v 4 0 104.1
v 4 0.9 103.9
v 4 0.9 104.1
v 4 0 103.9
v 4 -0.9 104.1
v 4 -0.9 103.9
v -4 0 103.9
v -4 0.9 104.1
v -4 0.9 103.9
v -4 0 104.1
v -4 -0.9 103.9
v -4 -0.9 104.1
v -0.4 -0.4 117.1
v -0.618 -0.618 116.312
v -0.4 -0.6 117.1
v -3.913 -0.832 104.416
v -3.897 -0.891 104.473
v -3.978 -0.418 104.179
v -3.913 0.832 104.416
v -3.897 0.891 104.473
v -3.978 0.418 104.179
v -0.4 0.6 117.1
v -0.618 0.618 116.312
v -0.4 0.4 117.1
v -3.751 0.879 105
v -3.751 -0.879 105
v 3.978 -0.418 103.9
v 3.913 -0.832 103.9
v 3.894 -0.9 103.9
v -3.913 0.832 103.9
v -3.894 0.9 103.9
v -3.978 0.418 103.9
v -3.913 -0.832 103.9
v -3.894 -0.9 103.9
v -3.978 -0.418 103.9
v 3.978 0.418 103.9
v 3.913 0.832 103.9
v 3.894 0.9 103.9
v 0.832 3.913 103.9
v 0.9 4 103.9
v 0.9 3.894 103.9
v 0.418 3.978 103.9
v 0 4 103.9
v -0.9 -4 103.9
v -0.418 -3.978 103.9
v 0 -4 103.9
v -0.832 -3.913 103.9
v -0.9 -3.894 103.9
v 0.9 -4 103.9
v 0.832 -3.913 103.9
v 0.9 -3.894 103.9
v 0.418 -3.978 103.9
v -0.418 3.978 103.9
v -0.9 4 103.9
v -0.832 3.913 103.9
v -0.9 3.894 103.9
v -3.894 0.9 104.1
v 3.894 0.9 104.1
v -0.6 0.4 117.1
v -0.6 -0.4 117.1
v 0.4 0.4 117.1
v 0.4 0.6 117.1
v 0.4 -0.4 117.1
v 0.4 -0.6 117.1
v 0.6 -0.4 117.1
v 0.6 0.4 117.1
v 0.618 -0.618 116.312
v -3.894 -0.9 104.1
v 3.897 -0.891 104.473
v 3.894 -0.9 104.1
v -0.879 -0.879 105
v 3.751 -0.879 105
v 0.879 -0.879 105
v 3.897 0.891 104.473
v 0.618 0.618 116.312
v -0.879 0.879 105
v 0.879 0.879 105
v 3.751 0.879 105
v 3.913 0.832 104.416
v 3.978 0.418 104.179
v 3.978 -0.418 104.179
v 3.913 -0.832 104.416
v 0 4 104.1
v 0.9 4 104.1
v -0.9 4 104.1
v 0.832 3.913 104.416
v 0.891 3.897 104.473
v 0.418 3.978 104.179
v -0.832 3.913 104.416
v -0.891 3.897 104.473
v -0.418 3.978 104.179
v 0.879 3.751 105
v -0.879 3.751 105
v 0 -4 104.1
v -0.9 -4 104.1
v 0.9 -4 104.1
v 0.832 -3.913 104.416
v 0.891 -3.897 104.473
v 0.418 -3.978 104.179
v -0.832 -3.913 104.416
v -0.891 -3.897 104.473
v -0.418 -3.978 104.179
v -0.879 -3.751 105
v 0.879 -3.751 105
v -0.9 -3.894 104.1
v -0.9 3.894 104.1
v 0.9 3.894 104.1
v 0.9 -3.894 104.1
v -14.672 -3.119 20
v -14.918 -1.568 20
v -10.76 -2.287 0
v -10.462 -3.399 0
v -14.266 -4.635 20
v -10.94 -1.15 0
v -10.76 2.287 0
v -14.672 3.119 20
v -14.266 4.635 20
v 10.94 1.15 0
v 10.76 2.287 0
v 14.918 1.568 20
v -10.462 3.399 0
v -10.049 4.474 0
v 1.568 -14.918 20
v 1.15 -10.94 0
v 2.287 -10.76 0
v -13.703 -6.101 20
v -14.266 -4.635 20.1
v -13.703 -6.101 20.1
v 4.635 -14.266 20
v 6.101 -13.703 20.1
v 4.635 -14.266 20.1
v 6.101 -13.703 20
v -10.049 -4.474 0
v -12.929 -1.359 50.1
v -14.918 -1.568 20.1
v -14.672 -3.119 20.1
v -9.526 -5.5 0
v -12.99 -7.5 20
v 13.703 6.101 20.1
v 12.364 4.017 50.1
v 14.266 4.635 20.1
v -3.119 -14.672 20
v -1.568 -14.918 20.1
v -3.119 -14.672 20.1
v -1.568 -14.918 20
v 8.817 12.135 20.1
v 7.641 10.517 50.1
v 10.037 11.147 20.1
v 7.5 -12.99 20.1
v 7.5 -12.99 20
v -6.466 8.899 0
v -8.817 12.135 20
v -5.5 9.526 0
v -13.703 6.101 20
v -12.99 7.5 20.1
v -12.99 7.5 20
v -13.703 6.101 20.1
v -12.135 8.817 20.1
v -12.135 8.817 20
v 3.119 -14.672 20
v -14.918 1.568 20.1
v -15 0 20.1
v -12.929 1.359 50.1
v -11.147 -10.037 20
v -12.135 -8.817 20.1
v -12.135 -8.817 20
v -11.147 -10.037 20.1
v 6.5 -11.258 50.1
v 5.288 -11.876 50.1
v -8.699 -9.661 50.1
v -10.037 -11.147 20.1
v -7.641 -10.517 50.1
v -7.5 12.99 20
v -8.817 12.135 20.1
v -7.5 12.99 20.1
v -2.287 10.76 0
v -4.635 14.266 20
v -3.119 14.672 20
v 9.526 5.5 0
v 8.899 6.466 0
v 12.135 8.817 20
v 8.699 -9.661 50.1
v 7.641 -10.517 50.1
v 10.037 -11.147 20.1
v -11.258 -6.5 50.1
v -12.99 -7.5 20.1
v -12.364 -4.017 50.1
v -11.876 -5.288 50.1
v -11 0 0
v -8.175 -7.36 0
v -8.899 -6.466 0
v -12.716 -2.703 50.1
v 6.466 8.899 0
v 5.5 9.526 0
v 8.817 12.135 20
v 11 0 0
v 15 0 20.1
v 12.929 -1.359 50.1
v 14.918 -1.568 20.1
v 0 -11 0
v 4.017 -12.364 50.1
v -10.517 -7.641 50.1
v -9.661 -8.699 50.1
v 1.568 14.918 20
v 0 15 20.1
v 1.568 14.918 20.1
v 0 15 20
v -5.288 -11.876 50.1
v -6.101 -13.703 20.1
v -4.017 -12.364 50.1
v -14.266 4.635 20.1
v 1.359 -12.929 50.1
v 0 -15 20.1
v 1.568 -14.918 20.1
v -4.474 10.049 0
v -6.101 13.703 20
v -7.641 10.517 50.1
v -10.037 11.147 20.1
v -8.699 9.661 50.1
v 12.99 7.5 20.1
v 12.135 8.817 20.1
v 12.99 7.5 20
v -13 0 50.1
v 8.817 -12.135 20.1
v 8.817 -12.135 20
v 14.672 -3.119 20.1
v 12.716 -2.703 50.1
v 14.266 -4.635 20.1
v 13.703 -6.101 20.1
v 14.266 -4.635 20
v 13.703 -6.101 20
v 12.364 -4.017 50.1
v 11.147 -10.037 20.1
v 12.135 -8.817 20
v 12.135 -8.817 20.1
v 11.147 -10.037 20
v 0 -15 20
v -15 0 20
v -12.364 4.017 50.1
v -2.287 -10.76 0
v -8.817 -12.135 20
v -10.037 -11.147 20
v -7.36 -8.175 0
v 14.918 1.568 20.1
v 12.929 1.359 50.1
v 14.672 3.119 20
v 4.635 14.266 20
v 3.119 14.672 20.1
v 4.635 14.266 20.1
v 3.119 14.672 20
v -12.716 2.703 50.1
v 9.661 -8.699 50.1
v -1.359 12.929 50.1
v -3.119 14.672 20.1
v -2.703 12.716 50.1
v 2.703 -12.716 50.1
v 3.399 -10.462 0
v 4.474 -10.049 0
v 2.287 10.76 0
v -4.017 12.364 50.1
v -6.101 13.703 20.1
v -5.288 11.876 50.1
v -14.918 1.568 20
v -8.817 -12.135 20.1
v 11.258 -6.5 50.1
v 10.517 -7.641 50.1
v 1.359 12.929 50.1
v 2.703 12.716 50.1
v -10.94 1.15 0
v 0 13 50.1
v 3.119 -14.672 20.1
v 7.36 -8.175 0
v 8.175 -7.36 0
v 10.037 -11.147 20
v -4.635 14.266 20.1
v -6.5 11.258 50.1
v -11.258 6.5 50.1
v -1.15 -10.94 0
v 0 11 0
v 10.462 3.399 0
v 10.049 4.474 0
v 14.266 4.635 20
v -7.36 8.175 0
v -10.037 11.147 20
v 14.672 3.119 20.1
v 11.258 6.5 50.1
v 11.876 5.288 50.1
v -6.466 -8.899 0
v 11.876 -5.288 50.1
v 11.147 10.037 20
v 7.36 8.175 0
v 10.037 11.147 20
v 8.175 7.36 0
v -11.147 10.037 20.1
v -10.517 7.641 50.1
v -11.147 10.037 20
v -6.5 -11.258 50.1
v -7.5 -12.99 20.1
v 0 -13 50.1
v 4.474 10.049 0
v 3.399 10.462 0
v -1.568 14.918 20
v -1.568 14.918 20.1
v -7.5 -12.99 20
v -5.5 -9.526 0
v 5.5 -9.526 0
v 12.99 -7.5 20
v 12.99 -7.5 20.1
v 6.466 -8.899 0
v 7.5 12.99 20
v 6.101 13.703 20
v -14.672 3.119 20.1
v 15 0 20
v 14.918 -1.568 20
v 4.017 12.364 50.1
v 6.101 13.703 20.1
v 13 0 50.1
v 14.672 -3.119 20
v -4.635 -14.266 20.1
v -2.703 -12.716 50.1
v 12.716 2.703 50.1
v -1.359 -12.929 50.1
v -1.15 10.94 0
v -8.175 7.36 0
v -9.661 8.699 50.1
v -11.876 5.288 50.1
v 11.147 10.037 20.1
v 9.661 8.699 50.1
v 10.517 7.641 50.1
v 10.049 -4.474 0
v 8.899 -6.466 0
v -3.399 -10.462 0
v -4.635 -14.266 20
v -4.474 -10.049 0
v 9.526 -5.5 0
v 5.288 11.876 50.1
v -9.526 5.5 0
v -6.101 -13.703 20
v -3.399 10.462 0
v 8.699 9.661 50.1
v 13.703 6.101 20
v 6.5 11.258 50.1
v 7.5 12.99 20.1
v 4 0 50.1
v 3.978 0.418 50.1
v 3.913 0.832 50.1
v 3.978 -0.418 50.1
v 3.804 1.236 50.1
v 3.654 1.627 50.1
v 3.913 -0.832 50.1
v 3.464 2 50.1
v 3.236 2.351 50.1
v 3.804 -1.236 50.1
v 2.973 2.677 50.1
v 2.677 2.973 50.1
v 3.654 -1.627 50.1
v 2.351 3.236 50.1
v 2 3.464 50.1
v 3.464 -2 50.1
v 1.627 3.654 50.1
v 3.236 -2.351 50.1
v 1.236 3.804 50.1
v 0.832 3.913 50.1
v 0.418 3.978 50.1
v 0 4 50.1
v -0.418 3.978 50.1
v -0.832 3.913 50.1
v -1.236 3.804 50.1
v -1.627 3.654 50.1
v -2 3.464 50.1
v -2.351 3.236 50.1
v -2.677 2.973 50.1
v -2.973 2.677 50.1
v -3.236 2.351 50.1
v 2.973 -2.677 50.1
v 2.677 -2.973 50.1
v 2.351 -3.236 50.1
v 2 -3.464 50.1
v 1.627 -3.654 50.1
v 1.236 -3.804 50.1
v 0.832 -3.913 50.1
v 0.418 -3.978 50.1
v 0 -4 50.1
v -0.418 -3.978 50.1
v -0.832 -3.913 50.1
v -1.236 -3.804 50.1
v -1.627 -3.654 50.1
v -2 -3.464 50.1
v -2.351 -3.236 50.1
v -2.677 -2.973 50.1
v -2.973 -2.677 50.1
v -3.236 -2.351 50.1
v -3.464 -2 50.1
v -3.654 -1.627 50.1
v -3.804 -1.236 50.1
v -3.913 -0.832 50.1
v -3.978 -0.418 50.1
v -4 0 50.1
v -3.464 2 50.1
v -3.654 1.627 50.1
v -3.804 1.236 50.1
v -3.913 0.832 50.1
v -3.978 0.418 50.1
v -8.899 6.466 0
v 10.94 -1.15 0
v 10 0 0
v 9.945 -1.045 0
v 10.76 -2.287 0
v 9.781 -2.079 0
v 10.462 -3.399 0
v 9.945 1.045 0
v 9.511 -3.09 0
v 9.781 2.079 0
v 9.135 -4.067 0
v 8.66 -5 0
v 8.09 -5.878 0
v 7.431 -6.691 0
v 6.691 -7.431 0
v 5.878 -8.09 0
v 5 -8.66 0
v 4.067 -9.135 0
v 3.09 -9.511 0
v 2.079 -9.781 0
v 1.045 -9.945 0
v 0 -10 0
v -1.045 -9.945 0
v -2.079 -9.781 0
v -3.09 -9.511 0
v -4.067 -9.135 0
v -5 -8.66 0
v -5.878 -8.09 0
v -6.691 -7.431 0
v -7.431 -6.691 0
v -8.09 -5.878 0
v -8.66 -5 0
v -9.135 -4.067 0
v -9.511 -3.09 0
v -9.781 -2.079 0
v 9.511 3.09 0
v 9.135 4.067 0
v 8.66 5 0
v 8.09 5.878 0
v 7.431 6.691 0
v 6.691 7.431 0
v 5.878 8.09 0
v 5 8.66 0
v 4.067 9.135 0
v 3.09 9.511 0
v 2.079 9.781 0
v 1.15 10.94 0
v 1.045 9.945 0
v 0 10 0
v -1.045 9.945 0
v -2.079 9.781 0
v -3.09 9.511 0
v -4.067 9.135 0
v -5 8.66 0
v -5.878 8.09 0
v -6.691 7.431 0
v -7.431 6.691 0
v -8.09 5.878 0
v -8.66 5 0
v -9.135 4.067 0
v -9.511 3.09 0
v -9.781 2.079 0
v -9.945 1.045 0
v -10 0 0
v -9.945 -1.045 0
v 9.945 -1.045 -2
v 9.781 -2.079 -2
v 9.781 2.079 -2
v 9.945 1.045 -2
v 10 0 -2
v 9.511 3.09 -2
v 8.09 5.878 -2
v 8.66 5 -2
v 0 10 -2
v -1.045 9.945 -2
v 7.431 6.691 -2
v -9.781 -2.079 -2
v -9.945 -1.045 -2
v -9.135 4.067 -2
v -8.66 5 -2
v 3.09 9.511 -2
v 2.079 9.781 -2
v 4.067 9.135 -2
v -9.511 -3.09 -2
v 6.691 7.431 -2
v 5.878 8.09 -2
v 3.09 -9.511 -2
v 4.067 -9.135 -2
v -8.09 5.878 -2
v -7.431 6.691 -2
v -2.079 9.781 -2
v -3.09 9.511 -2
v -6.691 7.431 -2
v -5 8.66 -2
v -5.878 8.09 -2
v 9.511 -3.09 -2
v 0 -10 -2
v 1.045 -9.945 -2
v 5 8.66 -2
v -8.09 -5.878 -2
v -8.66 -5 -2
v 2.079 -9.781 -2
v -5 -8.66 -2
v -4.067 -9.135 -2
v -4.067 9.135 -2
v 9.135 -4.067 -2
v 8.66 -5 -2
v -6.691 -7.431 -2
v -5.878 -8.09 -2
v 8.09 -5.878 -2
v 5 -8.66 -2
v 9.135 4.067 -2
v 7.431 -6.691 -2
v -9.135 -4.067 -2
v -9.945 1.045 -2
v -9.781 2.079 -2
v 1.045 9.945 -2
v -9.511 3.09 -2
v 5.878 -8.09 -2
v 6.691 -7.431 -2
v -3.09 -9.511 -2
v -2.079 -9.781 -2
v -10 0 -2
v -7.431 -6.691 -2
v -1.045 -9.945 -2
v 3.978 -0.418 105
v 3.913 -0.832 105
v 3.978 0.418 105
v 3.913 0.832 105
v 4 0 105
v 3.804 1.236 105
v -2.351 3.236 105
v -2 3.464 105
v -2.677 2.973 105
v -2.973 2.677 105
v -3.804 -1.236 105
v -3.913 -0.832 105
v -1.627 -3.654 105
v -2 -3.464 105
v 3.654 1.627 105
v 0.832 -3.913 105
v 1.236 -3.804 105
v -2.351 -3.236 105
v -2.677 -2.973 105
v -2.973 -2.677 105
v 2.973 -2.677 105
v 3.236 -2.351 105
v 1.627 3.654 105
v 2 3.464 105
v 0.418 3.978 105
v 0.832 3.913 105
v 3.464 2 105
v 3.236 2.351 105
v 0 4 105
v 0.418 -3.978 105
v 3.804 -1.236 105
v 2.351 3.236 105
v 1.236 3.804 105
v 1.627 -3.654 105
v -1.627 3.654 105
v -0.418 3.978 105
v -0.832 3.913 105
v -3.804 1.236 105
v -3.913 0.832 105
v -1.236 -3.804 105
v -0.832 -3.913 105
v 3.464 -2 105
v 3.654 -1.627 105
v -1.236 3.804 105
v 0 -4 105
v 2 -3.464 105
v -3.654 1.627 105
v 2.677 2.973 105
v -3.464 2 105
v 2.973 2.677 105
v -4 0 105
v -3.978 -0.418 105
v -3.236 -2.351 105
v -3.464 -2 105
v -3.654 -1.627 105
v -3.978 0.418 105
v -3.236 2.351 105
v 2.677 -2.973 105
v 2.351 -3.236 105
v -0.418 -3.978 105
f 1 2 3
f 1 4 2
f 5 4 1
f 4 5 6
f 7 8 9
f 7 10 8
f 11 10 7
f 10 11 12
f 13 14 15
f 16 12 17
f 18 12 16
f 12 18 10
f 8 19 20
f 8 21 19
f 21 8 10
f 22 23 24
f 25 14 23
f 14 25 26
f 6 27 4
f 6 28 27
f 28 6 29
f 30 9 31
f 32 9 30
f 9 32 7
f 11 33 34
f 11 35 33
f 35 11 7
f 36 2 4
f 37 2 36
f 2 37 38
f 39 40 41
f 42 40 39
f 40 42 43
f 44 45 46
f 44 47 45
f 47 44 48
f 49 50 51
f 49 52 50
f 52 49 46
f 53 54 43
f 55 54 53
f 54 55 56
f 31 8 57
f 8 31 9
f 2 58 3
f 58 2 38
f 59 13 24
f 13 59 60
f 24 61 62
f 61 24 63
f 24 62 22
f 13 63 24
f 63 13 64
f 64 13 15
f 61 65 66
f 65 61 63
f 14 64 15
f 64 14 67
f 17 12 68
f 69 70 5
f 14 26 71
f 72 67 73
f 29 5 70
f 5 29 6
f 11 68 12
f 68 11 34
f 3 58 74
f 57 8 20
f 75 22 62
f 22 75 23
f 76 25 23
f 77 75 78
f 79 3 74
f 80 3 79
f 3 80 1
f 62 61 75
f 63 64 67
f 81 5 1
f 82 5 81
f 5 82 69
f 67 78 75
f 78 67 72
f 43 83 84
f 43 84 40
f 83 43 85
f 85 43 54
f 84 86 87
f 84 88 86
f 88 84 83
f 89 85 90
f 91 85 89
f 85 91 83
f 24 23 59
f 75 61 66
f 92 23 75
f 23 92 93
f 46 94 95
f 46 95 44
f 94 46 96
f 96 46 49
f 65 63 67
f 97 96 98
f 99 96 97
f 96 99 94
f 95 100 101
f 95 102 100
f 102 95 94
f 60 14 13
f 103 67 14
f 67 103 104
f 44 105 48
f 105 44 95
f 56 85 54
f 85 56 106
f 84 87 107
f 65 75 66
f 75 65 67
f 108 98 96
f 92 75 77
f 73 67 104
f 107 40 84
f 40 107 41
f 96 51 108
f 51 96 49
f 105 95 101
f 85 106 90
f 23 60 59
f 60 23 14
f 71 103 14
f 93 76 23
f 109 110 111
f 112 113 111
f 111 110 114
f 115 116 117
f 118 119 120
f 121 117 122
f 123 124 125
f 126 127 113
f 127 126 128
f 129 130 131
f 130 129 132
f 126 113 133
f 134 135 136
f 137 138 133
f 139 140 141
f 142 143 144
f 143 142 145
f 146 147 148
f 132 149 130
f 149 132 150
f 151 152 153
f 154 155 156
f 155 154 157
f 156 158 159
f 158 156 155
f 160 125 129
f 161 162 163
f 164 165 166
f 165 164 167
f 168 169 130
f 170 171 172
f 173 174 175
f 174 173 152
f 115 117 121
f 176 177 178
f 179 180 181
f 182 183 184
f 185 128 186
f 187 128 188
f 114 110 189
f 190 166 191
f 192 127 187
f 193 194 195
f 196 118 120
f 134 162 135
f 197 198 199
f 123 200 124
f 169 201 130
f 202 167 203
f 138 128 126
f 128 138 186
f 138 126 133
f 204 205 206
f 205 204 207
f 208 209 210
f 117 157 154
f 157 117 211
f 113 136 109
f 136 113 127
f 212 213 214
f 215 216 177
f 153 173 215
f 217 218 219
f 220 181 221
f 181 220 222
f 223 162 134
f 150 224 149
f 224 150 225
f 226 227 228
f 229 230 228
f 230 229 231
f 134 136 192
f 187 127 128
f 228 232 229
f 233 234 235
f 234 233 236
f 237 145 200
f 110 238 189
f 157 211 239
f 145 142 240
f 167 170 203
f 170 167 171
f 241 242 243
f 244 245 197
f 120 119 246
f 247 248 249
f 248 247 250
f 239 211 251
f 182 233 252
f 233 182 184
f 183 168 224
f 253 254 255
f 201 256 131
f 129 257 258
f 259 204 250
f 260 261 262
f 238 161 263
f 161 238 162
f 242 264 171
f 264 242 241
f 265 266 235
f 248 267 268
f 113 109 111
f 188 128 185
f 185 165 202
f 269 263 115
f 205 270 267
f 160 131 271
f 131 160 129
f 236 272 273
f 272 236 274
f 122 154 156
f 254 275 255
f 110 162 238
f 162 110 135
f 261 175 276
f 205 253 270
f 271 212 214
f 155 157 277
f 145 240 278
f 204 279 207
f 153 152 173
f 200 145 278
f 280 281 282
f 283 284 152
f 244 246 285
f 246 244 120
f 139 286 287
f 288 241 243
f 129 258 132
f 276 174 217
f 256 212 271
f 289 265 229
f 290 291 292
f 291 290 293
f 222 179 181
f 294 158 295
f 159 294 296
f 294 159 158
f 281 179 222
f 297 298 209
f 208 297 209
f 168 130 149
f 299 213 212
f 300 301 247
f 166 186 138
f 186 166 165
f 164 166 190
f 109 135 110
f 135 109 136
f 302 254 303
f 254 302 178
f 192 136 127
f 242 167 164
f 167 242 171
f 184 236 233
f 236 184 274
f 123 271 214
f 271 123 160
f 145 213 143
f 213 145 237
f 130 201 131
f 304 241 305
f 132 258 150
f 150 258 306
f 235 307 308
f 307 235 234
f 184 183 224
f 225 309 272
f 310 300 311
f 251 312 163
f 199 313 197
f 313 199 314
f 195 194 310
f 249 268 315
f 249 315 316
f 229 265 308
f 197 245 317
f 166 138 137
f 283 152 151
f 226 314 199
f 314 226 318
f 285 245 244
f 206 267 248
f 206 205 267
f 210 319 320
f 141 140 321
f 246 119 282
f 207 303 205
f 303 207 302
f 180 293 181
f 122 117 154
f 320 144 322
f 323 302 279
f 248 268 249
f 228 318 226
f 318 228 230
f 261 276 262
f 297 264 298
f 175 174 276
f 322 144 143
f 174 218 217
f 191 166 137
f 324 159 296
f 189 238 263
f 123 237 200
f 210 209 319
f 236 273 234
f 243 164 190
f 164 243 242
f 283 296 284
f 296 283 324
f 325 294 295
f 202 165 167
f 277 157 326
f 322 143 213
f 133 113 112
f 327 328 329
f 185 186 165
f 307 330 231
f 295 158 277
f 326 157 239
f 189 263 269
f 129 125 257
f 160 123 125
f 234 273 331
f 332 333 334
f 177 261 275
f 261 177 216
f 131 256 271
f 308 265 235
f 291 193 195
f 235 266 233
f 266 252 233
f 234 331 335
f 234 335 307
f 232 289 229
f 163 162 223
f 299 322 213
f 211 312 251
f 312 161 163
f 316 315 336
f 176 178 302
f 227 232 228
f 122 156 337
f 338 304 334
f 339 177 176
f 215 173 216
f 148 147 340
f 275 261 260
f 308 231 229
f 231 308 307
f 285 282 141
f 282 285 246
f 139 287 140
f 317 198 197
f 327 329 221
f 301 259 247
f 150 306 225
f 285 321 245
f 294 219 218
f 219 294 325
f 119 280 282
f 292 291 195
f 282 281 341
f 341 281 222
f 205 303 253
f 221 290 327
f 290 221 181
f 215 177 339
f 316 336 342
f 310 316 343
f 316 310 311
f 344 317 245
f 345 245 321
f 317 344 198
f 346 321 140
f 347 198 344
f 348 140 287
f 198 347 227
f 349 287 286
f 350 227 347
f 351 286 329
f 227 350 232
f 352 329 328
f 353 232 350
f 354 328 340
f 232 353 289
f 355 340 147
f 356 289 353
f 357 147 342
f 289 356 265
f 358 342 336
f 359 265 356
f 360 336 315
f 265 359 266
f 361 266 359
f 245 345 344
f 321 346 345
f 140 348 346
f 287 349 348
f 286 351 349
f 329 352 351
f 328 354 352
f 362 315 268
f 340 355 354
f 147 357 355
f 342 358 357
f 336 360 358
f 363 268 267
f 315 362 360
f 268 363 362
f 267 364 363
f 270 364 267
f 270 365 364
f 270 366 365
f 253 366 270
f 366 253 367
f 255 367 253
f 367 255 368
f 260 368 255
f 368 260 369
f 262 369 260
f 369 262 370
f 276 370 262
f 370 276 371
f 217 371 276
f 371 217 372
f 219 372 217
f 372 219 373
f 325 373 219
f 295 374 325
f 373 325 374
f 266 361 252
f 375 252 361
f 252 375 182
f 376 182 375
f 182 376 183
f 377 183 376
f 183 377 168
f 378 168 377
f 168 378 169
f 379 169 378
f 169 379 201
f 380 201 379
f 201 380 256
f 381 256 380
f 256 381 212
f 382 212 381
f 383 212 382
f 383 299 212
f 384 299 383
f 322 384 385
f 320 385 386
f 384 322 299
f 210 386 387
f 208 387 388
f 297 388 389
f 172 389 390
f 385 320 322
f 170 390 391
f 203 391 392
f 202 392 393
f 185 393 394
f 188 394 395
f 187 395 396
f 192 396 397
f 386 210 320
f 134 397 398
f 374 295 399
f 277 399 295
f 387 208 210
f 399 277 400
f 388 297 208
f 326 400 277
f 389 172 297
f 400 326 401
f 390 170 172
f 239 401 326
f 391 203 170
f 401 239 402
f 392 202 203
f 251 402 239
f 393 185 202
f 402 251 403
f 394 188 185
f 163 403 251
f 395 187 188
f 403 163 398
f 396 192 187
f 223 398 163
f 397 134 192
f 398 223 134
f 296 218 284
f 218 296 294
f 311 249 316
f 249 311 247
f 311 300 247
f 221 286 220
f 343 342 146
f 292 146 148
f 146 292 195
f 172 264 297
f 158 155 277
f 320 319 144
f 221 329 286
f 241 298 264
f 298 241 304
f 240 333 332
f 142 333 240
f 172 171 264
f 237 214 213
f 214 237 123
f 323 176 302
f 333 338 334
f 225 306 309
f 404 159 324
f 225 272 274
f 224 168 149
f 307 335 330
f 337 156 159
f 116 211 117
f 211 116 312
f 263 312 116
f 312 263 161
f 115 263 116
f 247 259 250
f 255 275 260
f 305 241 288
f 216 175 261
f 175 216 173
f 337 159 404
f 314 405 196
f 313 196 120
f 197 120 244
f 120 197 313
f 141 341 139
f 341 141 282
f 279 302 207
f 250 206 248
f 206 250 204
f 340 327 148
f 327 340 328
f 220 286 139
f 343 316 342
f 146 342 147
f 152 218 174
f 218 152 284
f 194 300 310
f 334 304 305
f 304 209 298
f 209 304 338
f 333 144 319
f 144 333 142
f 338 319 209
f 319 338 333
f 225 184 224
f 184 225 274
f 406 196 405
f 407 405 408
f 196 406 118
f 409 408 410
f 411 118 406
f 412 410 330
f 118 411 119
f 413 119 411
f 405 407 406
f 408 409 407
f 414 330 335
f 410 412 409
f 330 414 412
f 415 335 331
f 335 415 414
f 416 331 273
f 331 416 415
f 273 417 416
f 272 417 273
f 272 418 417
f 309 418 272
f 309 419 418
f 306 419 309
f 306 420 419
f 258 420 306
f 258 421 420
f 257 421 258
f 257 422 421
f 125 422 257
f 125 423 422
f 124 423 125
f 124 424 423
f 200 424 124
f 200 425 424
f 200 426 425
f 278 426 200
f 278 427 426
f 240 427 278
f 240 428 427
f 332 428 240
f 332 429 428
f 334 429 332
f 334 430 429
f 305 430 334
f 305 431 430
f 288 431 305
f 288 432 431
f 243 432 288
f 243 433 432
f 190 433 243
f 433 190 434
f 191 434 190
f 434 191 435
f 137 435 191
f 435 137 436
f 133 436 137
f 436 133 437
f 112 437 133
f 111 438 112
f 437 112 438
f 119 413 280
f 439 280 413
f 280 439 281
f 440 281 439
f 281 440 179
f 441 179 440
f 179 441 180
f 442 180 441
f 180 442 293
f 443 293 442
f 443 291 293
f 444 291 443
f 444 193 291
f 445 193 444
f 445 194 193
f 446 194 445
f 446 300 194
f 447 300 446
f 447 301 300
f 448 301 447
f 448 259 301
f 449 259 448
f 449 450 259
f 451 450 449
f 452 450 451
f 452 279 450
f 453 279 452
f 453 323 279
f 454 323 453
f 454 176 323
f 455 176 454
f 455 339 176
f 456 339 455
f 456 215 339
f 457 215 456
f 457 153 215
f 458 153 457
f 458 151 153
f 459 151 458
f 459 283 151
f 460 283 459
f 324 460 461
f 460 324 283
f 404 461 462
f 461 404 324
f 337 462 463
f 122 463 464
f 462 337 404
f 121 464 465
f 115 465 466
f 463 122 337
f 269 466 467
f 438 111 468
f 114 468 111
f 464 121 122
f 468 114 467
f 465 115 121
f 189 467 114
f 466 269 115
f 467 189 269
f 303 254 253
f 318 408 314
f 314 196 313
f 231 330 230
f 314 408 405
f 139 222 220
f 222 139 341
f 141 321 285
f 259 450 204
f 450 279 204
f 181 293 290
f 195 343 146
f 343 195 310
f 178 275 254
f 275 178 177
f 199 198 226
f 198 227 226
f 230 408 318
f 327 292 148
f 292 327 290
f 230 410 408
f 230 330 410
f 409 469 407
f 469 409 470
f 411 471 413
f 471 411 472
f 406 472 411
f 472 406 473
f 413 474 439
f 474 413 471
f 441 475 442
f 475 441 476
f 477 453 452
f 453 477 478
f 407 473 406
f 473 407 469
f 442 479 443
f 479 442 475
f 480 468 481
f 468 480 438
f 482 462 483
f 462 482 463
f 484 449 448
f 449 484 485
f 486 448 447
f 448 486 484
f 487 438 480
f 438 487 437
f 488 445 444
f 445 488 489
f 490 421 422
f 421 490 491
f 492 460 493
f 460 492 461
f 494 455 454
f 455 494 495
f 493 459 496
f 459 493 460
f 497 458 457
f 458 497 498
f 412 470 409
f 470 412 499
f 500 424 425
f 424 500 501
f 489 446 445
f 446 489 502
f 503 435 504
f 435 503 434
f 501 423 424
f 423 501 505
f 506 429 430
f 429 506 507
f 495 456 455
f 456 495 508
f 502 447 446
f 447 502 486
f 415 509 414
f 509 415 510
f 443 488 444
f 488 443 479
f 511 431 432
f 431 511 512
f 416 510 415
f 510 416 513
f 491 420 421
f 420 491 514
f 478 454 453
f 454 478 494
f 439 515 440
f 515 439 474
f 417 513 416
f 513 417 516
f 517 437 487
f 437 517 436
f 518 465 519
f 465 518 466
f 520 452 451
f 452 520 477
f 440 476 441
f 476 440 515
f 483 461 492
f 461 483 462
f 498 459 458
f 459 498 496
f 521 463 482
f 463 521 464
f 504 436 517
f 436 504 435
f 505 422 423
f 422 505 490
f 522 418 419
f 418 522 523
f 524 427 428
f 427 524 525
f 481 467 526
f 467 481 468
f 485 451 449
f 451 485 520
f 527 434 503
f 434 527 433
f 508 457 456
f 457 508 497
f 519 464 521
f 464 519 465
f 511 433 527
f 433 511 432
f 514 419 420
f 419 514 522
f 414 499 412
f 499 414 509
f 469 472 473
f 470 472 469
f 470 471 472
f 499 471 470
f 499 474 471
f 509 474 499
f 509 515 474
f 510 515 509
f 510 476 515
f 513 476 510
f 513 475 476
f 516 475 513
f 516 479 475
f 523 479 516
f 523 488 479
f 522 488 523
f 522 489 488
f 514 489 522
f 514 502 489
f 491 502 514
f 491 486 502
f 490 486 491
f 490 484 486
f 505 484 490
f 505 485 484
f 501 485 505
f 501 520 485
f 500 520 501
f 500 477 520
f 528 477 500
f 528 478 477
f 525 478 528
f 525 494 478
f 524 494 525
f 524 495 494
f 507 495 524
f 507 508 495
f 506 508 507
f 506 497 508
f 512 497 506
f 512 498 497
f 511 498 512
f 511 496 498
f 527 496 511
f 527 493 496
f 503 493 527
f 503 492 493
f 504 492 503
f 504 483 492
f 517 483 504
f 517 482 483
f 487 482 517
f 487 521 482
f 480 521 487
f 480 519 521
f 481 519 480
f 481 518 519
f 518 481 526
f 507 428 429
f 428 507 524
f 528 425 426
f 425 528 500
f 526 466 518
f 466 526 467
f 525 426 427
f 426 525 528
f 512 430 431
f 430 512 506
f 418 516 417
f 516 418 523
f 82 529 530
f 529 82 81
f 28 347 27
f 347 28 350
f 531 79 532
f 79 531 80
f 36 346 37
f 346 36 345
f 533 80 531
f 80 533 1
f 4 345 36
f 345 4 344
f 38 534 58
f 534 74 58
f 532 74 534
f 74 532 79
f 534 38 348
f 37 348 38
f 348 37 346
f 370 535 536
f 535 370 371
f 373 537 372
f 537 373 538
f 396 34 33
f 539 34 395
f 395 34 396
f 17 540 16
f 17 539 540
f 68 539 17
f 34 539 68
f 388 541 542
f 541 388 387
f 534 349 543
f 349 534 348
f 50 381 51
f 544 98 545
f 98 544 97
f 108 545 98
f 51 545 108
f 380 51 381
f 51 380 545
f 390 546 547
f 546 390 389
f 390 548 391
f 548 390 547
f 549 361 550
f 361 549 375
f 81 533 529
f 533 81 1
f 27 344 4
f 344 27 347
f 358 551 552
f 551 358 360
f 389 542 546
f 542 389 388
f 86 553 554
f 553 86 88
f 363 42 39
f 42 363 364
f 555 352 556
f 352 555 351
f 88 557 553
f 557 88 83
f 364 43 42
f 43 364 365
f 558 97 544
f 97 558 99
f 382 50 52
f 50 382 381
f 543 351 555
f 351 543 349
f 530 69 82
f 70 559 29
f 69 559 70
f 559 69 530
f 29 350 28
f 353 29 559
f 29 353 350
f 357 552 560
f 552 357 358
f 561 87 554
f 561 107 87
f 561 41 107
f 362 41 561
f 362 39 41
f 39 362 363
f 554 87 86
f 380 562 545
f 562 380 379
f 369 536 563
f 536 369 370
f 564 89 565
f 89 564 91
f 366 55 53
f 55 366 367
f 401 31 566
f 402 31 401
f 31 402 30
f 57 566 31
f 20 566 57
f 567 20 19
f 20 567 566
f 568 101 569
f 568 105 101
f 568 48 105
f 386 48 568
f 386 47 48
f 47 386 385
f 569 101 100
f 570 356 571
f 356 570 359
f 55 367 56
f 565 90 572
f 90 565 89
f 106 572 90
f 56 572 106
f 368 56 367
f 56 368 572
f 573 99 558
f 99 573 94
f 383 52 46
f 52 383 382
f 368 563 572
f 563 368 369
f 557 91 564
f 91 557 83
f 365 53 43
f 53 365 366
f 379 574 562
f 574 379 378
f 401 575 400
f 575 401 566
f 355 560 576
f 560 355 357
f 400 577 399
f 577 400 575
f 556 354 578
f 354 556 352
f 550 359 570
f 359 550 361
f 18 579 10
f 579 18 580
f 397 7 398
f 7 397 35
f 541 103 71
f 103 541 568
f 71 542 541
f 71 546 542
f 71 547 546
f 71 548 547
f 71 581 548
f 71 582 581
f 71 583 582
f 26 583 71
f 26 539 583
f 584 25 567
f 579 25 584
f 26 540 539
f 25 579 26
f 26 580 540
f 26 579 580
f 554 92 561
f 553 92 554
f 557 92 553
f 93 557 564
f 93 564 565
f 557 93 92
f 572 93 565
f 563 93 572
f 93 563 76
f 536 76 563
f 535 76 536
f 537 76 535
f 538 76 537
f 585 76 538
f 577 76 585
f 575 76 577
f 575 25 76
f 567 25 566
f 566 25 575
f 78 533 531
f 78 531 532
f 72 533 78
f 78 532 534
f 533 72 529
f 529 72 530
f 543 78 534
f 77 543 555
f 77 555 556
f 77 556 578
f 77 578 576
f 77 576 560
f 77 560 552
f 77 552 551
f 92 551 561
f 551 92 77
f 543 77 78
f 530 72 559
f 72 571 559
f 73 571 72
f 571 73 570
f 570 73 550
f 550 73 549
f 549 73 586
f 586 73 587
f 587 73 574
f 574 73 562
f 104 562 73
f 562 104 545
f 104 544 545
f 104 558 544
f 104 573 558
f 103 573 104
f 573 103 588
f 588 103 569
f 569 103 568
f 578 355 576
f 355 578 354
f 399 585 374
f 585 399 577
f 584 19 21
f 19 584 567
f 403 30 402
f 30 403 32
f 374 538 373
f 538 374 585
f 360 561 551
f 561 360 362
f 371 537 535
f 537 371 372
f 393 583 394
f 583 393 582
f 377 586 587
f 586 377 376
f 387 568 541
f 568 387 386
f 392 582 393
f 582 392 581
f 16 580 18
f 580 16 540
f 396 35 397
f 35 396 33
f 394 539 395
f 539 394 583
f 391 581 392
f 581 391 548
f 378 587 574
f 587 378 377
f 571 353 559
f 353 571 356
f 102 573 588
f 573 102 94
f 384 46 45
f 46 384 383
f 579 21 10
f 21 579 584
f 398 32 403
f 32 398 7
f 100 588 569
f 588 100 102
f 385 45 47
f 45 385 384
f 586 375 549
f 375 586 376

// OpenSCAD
// file: _common.scad
// mechanism 共用設定 + 齒輪 module
$fn = 60;

// 簡化齒輪：N 個齒、節圓半徑 r、齒高 h、齒寬 w
module simple_gear(N = 16, r = 20, h = 4, thick = 6) {
  union() {
    // 主圓盤
    cylinder(h = thick, r = r, center = true);
    // 齒（梯形）
    for (i = [0:N-1]) {
      rotate([0, 0, i * 360 / N])
        translate([r, 0, 0])
          linear_extrude(height = thick, center = true)
            polygon([[0, -2.4], [h, -1.4], [h, 1.4], [0, 2.4]]);
    }
    // 中心凸軸
    cylinder(h = thick * 1.4, r = r * 0.18, center = true);
  }
}
// main file
// 螺絲起子 Screwdriver — 紅色塑膠握把 + 鋼軸 + 十字頭
include <_common.scad>

// 握把（紅色塑膠，腰鼓形）
color([0.86, 0.15, 0.15])
  hull() {
    cylinder(h = 0.1, r = 11);
    translate([0, 0, 20]) cylinder(h = 0.1, r = 15);
    translate([0, 0, 50]) cylinder(h = 0.1, r = 13);
  }

// 握把端蓋
color([0.7, 0.1, 0.1])
  translate([0, 0, -2]) cylinder(h = 4, r = 10);

// 鋼軸
color([0.7, 0.7, 0.7])
  translate([0, 0, 50]) cylinder(h = 55, r = 4);

// 十字頭（PH2 簡化）：2026-10 修正：原本是平頭十字方塊；PH 刀頭是往前收尖的十字（四片翼從軸徑收到尖端）
color([0.55, 0.55, 0.55])
  for (a = [0, 90]) rotate([0, 0, a])
    hull() {
      translate([0, 0, 104]) cube([8, 1.8, 0.2], center = true);
      translate([0, 0, 117]) cube([0.8, 1.2, 0.2], center = true);
    }
